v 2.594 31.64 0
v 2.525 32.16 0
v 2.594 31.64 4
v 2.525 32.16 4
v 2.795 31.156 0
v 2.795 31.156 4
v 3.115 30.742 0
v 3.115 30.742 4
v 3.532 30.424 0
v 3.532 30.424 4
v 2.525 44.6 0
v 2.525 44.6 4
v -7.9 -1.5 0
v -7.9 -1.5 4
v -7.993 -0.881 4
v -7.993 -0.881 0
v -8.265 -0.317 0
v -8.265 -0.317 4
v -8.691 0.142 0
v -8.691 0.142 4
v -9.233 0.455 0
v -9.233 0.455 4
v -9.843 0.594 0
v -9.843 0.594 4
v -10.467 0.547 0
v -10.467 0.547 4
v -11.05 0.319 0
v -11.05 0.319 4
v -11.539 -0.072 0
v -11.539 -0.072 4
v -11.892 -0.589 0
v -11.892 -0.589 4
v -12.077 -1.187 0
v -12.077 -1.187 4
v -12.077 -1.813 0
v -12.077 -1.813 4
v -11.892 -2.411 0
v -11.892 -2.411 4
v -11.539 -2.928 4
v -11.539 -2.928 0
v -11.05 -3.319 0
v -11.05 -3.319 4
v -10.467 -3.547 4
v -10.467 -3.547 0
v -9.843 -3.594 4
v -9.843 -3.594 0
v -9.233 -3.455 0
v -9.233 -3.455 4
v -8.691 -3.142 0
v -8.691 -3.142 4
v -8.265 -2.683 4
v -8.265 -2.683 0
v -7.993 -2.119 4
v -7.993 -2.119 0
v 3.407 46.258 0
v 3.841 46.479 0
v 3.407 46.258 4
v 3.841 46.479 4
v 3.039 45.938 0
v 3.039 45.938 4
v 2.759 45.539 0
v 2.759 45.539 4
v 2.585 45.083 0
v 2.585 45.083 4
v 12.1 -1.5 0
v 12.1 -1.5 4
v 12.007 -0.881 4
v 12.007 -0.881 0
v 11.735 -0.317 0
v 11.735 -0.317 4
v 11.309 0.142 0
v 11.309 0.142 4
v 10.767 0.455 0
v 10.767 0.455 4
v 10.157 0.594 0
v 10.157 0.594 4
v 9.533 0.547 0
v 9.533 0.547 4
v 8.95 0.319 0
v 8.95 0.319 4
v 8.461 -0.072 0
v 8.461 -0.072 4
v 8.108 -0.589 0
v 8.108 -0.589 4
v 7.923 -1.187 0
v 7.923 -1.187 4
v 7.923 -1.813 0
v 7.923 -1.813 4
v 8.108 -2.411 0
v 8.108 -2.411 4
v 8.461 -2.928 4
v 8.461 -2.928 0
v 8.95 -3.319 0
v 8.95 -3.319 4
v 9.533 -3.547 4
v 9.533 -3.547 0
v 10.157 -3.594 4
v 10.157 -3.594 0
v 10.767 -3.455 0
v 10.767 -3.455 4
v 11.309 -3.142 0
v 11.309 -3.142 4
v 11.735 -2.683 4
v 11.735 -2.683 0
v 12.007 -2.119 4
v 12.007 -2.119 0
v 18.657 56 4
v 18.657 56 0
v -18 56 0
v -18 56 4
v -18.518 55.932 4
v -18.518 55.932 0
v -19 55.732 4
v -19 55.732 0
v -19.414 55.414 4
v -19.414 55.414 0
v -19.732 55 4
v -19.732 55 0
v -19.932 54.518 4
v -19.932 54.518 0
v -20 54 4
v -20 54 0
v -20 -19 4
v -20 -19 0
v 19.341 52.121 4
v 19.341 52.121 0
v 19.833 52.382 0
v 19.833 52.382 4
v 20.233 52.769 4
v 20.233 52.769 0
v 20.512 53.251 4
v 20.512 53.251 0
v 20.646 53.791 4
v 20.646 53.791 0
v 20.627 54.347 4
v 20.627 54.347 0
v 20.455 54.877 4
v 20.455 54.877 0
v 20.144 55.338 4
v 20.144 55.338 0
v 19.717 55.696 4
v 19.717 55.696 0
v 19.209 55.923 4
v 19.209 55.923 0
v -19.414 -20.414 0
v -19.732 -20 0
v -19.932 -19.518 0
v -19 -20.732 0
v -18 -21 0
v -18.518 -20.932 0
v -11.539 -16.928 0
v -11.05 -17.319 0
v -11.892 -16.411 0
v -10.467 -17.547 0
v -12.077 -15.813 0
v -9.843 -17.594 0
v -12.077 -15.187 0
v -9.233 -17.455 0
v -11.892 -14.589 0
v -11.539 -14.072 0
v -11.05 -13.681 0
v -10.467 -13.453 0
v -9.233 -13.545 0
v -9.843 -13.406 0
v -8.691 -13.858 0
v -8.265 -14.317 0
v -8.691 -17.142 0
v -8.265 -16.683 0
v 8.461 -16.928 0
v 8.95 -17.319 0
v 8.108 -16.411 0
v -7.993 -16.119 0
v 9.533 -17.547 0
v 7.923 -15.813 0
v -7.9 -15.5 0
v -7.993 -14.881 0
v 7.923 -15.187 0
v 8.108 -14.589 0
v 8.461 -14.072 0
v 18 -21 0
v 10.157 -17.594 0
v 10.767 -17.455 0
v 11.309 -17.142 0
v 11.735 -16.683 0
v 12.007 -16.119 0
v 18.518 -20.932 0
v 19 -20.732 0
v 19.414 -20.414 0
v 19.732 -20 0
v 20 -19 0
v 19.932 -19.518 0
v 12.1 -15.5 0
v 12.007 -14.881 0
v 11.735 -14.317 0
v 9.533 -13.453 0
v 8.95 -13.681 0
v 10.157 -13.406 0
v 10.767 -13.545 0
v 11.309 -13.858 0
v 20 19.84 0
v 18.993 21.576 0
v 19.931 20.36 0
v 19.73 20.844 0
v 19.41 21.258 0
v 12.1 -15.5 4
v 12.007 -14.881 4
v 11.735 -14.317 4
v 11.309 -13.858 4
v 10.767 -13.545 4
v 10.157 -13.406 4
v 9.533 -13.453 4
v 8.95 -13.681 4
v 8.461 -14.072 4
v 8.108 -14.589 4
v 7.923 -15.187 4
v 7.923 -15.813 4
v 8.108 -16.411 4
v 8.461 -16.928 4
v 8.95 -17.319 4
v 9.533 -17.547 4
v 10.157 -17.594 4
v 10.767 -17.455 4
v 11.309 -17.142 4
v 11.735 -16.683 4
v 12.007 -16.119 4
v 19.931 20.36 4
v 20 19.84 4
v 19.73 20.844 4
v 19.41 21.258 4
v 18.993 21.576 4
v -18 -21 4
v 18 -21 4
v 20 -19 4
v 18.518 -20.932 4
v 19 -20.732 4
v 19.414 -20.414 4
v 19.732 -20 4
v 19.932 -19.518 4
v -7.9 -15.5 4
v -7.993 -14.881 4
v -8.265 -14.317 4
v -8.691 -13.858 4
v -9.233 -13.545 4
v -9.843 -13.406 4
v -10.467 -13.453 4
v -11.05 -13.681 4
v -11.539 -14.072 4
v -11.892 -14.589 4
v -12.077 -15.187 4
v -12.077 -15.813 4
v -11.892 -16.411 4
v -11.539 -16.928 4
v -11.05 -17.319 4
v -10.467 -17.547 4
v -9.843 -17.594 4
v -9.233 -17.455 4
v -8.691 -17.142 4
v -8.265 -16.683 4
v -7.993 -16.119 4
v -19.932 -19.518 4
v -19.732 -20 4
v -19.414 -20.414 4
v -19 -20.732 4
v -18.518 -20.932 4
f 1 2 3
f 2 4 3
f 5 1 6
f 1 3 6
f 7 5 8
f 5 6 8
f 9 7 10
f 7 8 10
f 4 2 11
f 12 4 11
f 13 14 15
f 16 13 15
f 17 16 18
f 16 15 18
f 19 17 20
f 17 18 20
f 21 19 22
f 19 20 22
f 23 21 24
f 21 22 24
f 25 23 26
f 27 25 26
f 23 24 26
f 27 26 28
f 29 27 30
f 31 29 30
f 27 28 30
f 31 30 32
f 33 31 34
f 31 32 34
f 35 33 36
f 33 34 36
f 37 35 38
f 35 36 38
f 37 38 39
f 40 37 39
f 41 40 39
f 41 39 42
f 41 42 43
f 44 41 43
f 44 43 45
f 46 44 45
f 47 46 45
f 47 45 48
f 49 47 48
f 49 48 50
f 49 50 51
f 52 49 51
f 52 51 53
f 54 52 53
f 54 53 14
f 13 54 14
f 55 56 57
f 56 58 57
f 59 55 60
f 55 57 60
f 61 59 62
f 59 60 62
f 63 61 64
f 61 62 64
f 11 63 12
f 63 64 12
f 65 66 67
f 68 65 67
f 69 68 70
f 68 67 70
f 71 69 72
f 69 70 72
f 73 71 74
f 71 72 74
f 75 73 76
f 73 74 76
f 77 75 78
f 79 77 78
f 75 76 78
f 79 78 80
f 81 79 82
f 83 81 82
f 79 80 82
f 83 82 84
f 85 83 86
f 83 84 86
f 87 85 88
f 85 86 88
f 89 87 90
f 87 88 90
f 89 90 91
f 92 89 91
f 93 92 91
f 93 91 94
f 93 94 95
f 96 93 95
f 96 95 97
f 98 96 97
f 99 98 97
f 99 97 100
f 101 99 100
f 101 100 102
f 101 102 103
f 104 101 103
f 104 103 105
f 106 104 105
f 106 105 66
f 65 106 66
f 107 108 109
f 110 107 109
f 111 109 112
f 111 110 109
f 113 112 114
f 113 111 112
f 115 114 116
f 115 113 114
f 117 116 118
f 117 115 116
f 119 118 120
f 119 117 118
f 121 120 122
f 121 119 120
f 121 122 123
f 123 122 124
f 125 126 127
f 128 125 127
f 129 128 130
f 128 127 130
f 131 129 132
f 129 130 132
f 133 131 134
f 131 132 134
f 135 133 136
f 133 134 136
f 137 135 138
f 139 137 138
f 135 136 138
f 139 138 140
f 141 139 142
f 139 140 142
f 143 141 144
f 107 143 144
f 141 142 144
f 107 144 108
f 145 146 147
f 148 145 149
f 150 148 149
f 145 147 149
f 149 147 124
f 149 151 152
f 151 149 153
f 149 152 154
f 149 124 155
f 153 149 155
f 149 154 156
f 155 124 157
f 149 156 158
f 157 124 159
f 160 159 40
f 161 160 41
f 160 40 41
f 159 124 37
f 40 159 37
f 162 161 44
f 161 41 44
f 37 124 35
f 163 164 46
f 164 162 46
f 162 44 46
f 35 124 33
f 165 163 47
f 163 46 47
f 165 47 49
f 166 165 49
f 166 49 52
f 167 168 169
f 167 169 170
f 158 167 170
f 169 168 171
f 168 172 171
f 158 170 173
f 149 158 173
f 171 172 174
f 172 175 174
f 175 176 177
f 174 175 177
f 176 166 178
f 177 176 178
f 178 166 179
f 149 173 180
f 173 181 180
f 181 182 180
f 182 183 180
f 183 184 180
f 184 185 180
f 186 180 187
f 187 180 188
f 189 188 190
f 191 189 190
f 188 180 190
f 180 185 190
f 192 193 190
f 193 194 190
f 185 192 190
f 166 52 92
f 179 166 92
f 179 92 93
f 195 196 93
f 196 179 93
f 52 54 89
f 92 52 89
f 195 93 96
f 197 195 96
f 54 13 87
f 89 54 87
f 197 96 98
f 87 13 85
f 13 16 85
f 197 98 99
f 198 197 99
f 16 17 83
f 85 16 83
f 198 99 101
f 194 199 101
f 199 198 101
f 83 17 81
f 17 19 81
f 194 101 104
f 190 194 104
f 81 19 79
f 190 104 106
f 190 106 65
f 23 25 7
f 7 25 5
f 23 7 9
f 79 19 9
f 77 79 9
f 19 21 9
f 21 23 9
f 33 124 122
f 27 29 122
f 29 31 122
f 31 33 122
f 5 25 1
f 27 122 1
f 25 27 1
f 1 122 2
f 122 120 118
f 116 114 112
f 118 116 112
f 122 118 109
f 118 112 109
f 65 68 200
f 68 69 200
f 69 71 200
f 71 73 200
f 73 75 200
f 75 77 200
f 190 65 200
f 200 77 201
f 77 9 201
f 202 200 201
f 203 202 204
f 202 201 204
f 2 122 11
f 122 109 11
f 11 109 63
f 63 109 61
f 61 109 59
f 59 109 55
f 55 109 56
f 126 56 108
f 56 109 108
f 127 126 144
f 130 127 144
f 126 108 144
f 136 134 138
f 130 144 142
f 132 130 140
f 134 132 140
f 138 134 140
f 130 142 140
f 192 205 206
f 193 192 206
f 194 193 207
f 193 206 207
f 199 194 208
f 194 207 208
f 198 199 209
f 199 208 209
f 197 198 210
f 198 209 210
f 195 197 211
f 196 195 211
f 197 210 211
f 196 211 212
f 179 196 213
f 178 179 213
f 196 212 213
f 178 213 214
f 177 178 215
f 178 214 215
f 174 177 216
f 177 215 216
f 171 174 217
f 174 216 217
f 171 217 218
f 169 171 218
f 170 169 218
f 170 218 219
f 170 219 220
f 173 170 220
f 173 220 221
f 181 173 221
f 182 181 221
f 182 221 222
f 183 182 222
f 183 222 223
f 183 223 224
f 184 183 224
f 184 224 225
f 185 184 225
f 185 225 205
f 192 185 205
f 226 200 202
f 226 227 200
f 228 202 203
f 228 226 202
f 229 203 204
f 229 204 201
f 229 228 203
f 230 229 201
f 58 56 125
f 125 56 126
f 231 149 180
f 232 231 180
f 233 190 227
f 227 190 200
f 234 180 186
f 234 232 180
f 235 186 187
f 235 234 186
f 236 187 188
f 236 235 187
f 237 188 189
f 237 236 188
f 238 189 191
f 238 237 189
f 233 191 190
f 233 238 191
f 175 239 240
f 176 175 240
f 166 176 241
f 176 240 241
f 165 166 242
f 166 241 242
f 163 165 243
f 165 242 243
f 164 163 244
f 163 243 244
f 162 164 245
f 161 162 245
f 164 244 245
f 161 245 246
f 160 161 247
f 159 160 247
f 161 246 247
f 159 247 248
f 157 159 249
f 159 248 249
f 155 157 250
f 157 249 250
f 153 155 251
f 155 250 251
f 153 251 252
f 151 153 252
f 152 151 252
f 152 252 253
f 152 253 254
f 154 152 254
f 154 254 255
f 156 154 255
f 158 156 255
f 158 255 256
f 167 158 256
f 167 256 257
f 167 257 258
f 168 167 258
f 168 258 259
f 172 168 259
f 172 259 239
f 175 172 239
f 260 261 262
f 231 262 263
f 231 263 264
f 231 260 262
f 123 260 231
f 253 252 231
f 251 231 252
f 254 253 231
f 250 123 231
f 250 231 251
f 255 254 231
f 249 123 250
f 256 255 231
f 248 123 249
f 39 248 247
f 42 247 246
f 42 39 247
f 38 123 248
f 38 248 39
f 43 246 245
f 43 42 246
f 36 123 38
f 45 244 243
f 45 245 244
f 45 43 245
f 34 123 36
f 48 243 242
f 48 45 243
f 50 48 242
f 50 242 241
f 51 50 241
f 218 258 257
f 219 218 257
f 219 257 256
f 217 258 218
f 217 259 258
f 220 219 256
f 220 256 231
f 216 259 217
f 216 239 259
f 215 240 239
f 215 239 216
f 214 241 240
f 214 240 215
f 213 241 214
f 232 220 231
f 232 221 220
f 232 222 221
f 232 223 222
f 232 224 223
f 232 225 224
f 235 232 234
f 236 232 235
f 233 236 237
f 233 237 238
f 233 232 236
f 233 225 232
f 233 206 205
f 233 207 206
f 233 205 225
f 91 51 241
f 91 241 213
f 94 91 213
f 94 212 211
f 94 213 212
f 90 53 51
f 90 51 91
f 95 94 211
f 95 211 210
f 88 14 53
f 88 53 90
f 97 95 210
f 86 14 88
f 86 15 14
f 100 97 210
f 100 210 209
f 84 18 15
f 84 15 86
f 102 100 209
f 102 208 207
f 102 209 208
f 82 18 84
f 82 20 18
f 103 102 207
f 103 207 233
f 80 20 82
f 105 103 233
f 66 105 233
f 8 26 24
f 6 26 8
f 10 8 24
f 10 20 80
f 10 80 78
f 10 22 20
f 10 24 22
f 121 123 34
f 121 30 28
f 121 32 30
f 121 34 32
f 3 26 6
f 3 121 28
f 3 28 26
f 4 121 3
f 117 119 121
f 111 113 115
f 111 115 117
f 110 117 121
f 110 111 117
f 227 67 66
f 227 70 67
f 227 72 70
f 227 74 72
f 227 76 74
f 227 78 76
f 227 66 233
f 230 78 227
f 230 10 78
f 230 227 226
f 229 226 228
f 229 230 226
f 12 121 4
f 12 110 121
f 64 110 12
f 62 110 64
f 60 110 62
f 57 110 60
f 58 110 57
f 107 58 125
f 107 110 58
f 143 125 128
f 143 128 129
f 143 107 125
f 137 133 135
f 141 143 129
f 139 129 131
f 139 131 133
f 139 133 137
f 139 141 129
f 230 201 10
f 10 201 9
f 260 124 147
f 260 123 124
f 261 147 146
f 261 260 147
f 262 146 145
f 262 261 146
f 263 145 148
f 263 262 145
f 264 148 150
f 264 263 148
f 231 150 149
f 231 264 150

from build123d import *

# Parameters (mm, degrees)
EXTRUDE_1_DEPTH     = 4
CUT_EXTRUDE_1_REACH = 61.822
SKETCH_2_R          = 2.1
FILLET_1_R          = 2


with BuildPart() as part:
    # 草图1 → 凸台-拉伸1 (new body)
    with BuildSketch(Plane.XY):
        with BuildLine():
            Line((18.657436361, 56), (-20, 56))
            Line((-20, 56), (-20, 21))
            Line((-20, 21), (-20, -21))
            Line((-20, -21), (20, -21))
            Line((20, -21), (20, 21))
            Line((20, 21), (2.525225805, 31))
            Line((2.525225805, 31), (2.525225805, 46))
            Line((2.525225805, 46), (19.341476647, 52.120614758))
            ThreePointArc((19.341476647, 52.120614758), (20.627051867, 54.347296355), (18.657436361, 56))
        make_face()
    extrude(amount=EXTRUDE_1_DEPTH)

    # 草图2 → 切除-拉伸1 (cut, up to next)
    with BuildSketch(Plane.XY.offset(4), mode=Mode.PRIVATE) as cut_extrude_1_sk1:
        with Locations((-10, -15.5)):
            Circle(SKETCH_2_R)
    cut_extrude_1_tool1 = extrude(cut_extrude_1_sk1.sketch, amount=-CUT_EXTRUDE_1_REACH, mode=Mode.PRIVATE) & part.part
    # 草图2 → 切除-拉伸1 (cut, up to next)
    with BuildSketch(Plane.XY.offset(4), mode=Mode.PRIVATE) as cut_extrude_1_sk2:
        with Locations((-10, -1.5)):
            Circle(SKETCH_2_R)
    cut_extrude_1_tool2 = extrude(cut_extrude_1_sk2.sketch, amount=-CUT_EXTRUDE_1_REACH, mode=Mode.PRIVATE) & part.part
    # 草图2 → 切除-拉伸1 (cut, up to next)
    with BuildSketch(Plane.XY.offset(4), mode=Mode.PRIVATE) as cut_extrude_1_sk3:
        with Locations((10, -1.5)):
            Circle(SKETCH_2_R)
    cut_extrude_1_tool3 = extrude(cut_extrude_1_sk3.sketch, amount=-CUT_EXTRUDE_1_REACH, mode=Mode.PRIVATE) & part.part
    # 草图2 → 切除-拉伸1 (cut, up to next)
    with BuildSketch(Plane.XY.offset(4), mode=Mode.PRIVATE) as cut_extrude_1_sk4:
        with Locations((10, -15.5)):
            Circle(SKETCH_2_R)
    cut_extrude_1_tool4 = extrude(cut_extrude_1_sk4.sketch, amount=-CUT_EXTRUDE_1_REACH, mode=Mode.PRIVATE) & part.part
    add(cut_extrude_1_tool1.solids().sort_by_distance((-10, -15.5, 4))[0], mode=Mode.SUBTRACT)
    add(cut_extrude_1_tool2.solids().sort_by_distance((-10, -1.5, 4))[0], mode=Mode.SUBTRACT)
    add(cut_extrude_1_tool3.solids().sort_by_distance((10, -1.5, 4))[0], mode=Mode.SUBTRACT)
    add(cut_extrude_1_tool4.solids().sort_by_distance((10, -15.5, 4))[0], mode=Mode.SUBTRACT)

    # 圆角1
    fillet_1_edges = [part.edges().sort_by_distance(p)[0] for p in [
        (2.525225805, 46, 2),
        (2.525225805, 31, 2),
        (20, 21, 2),
        (20, -21, 2),
        (-20, -21, 2),
        (-20, 56, 2),
    ]]
    fillet(fillet_1_edges, radius=FILLET_1_R)


solid = part.part
